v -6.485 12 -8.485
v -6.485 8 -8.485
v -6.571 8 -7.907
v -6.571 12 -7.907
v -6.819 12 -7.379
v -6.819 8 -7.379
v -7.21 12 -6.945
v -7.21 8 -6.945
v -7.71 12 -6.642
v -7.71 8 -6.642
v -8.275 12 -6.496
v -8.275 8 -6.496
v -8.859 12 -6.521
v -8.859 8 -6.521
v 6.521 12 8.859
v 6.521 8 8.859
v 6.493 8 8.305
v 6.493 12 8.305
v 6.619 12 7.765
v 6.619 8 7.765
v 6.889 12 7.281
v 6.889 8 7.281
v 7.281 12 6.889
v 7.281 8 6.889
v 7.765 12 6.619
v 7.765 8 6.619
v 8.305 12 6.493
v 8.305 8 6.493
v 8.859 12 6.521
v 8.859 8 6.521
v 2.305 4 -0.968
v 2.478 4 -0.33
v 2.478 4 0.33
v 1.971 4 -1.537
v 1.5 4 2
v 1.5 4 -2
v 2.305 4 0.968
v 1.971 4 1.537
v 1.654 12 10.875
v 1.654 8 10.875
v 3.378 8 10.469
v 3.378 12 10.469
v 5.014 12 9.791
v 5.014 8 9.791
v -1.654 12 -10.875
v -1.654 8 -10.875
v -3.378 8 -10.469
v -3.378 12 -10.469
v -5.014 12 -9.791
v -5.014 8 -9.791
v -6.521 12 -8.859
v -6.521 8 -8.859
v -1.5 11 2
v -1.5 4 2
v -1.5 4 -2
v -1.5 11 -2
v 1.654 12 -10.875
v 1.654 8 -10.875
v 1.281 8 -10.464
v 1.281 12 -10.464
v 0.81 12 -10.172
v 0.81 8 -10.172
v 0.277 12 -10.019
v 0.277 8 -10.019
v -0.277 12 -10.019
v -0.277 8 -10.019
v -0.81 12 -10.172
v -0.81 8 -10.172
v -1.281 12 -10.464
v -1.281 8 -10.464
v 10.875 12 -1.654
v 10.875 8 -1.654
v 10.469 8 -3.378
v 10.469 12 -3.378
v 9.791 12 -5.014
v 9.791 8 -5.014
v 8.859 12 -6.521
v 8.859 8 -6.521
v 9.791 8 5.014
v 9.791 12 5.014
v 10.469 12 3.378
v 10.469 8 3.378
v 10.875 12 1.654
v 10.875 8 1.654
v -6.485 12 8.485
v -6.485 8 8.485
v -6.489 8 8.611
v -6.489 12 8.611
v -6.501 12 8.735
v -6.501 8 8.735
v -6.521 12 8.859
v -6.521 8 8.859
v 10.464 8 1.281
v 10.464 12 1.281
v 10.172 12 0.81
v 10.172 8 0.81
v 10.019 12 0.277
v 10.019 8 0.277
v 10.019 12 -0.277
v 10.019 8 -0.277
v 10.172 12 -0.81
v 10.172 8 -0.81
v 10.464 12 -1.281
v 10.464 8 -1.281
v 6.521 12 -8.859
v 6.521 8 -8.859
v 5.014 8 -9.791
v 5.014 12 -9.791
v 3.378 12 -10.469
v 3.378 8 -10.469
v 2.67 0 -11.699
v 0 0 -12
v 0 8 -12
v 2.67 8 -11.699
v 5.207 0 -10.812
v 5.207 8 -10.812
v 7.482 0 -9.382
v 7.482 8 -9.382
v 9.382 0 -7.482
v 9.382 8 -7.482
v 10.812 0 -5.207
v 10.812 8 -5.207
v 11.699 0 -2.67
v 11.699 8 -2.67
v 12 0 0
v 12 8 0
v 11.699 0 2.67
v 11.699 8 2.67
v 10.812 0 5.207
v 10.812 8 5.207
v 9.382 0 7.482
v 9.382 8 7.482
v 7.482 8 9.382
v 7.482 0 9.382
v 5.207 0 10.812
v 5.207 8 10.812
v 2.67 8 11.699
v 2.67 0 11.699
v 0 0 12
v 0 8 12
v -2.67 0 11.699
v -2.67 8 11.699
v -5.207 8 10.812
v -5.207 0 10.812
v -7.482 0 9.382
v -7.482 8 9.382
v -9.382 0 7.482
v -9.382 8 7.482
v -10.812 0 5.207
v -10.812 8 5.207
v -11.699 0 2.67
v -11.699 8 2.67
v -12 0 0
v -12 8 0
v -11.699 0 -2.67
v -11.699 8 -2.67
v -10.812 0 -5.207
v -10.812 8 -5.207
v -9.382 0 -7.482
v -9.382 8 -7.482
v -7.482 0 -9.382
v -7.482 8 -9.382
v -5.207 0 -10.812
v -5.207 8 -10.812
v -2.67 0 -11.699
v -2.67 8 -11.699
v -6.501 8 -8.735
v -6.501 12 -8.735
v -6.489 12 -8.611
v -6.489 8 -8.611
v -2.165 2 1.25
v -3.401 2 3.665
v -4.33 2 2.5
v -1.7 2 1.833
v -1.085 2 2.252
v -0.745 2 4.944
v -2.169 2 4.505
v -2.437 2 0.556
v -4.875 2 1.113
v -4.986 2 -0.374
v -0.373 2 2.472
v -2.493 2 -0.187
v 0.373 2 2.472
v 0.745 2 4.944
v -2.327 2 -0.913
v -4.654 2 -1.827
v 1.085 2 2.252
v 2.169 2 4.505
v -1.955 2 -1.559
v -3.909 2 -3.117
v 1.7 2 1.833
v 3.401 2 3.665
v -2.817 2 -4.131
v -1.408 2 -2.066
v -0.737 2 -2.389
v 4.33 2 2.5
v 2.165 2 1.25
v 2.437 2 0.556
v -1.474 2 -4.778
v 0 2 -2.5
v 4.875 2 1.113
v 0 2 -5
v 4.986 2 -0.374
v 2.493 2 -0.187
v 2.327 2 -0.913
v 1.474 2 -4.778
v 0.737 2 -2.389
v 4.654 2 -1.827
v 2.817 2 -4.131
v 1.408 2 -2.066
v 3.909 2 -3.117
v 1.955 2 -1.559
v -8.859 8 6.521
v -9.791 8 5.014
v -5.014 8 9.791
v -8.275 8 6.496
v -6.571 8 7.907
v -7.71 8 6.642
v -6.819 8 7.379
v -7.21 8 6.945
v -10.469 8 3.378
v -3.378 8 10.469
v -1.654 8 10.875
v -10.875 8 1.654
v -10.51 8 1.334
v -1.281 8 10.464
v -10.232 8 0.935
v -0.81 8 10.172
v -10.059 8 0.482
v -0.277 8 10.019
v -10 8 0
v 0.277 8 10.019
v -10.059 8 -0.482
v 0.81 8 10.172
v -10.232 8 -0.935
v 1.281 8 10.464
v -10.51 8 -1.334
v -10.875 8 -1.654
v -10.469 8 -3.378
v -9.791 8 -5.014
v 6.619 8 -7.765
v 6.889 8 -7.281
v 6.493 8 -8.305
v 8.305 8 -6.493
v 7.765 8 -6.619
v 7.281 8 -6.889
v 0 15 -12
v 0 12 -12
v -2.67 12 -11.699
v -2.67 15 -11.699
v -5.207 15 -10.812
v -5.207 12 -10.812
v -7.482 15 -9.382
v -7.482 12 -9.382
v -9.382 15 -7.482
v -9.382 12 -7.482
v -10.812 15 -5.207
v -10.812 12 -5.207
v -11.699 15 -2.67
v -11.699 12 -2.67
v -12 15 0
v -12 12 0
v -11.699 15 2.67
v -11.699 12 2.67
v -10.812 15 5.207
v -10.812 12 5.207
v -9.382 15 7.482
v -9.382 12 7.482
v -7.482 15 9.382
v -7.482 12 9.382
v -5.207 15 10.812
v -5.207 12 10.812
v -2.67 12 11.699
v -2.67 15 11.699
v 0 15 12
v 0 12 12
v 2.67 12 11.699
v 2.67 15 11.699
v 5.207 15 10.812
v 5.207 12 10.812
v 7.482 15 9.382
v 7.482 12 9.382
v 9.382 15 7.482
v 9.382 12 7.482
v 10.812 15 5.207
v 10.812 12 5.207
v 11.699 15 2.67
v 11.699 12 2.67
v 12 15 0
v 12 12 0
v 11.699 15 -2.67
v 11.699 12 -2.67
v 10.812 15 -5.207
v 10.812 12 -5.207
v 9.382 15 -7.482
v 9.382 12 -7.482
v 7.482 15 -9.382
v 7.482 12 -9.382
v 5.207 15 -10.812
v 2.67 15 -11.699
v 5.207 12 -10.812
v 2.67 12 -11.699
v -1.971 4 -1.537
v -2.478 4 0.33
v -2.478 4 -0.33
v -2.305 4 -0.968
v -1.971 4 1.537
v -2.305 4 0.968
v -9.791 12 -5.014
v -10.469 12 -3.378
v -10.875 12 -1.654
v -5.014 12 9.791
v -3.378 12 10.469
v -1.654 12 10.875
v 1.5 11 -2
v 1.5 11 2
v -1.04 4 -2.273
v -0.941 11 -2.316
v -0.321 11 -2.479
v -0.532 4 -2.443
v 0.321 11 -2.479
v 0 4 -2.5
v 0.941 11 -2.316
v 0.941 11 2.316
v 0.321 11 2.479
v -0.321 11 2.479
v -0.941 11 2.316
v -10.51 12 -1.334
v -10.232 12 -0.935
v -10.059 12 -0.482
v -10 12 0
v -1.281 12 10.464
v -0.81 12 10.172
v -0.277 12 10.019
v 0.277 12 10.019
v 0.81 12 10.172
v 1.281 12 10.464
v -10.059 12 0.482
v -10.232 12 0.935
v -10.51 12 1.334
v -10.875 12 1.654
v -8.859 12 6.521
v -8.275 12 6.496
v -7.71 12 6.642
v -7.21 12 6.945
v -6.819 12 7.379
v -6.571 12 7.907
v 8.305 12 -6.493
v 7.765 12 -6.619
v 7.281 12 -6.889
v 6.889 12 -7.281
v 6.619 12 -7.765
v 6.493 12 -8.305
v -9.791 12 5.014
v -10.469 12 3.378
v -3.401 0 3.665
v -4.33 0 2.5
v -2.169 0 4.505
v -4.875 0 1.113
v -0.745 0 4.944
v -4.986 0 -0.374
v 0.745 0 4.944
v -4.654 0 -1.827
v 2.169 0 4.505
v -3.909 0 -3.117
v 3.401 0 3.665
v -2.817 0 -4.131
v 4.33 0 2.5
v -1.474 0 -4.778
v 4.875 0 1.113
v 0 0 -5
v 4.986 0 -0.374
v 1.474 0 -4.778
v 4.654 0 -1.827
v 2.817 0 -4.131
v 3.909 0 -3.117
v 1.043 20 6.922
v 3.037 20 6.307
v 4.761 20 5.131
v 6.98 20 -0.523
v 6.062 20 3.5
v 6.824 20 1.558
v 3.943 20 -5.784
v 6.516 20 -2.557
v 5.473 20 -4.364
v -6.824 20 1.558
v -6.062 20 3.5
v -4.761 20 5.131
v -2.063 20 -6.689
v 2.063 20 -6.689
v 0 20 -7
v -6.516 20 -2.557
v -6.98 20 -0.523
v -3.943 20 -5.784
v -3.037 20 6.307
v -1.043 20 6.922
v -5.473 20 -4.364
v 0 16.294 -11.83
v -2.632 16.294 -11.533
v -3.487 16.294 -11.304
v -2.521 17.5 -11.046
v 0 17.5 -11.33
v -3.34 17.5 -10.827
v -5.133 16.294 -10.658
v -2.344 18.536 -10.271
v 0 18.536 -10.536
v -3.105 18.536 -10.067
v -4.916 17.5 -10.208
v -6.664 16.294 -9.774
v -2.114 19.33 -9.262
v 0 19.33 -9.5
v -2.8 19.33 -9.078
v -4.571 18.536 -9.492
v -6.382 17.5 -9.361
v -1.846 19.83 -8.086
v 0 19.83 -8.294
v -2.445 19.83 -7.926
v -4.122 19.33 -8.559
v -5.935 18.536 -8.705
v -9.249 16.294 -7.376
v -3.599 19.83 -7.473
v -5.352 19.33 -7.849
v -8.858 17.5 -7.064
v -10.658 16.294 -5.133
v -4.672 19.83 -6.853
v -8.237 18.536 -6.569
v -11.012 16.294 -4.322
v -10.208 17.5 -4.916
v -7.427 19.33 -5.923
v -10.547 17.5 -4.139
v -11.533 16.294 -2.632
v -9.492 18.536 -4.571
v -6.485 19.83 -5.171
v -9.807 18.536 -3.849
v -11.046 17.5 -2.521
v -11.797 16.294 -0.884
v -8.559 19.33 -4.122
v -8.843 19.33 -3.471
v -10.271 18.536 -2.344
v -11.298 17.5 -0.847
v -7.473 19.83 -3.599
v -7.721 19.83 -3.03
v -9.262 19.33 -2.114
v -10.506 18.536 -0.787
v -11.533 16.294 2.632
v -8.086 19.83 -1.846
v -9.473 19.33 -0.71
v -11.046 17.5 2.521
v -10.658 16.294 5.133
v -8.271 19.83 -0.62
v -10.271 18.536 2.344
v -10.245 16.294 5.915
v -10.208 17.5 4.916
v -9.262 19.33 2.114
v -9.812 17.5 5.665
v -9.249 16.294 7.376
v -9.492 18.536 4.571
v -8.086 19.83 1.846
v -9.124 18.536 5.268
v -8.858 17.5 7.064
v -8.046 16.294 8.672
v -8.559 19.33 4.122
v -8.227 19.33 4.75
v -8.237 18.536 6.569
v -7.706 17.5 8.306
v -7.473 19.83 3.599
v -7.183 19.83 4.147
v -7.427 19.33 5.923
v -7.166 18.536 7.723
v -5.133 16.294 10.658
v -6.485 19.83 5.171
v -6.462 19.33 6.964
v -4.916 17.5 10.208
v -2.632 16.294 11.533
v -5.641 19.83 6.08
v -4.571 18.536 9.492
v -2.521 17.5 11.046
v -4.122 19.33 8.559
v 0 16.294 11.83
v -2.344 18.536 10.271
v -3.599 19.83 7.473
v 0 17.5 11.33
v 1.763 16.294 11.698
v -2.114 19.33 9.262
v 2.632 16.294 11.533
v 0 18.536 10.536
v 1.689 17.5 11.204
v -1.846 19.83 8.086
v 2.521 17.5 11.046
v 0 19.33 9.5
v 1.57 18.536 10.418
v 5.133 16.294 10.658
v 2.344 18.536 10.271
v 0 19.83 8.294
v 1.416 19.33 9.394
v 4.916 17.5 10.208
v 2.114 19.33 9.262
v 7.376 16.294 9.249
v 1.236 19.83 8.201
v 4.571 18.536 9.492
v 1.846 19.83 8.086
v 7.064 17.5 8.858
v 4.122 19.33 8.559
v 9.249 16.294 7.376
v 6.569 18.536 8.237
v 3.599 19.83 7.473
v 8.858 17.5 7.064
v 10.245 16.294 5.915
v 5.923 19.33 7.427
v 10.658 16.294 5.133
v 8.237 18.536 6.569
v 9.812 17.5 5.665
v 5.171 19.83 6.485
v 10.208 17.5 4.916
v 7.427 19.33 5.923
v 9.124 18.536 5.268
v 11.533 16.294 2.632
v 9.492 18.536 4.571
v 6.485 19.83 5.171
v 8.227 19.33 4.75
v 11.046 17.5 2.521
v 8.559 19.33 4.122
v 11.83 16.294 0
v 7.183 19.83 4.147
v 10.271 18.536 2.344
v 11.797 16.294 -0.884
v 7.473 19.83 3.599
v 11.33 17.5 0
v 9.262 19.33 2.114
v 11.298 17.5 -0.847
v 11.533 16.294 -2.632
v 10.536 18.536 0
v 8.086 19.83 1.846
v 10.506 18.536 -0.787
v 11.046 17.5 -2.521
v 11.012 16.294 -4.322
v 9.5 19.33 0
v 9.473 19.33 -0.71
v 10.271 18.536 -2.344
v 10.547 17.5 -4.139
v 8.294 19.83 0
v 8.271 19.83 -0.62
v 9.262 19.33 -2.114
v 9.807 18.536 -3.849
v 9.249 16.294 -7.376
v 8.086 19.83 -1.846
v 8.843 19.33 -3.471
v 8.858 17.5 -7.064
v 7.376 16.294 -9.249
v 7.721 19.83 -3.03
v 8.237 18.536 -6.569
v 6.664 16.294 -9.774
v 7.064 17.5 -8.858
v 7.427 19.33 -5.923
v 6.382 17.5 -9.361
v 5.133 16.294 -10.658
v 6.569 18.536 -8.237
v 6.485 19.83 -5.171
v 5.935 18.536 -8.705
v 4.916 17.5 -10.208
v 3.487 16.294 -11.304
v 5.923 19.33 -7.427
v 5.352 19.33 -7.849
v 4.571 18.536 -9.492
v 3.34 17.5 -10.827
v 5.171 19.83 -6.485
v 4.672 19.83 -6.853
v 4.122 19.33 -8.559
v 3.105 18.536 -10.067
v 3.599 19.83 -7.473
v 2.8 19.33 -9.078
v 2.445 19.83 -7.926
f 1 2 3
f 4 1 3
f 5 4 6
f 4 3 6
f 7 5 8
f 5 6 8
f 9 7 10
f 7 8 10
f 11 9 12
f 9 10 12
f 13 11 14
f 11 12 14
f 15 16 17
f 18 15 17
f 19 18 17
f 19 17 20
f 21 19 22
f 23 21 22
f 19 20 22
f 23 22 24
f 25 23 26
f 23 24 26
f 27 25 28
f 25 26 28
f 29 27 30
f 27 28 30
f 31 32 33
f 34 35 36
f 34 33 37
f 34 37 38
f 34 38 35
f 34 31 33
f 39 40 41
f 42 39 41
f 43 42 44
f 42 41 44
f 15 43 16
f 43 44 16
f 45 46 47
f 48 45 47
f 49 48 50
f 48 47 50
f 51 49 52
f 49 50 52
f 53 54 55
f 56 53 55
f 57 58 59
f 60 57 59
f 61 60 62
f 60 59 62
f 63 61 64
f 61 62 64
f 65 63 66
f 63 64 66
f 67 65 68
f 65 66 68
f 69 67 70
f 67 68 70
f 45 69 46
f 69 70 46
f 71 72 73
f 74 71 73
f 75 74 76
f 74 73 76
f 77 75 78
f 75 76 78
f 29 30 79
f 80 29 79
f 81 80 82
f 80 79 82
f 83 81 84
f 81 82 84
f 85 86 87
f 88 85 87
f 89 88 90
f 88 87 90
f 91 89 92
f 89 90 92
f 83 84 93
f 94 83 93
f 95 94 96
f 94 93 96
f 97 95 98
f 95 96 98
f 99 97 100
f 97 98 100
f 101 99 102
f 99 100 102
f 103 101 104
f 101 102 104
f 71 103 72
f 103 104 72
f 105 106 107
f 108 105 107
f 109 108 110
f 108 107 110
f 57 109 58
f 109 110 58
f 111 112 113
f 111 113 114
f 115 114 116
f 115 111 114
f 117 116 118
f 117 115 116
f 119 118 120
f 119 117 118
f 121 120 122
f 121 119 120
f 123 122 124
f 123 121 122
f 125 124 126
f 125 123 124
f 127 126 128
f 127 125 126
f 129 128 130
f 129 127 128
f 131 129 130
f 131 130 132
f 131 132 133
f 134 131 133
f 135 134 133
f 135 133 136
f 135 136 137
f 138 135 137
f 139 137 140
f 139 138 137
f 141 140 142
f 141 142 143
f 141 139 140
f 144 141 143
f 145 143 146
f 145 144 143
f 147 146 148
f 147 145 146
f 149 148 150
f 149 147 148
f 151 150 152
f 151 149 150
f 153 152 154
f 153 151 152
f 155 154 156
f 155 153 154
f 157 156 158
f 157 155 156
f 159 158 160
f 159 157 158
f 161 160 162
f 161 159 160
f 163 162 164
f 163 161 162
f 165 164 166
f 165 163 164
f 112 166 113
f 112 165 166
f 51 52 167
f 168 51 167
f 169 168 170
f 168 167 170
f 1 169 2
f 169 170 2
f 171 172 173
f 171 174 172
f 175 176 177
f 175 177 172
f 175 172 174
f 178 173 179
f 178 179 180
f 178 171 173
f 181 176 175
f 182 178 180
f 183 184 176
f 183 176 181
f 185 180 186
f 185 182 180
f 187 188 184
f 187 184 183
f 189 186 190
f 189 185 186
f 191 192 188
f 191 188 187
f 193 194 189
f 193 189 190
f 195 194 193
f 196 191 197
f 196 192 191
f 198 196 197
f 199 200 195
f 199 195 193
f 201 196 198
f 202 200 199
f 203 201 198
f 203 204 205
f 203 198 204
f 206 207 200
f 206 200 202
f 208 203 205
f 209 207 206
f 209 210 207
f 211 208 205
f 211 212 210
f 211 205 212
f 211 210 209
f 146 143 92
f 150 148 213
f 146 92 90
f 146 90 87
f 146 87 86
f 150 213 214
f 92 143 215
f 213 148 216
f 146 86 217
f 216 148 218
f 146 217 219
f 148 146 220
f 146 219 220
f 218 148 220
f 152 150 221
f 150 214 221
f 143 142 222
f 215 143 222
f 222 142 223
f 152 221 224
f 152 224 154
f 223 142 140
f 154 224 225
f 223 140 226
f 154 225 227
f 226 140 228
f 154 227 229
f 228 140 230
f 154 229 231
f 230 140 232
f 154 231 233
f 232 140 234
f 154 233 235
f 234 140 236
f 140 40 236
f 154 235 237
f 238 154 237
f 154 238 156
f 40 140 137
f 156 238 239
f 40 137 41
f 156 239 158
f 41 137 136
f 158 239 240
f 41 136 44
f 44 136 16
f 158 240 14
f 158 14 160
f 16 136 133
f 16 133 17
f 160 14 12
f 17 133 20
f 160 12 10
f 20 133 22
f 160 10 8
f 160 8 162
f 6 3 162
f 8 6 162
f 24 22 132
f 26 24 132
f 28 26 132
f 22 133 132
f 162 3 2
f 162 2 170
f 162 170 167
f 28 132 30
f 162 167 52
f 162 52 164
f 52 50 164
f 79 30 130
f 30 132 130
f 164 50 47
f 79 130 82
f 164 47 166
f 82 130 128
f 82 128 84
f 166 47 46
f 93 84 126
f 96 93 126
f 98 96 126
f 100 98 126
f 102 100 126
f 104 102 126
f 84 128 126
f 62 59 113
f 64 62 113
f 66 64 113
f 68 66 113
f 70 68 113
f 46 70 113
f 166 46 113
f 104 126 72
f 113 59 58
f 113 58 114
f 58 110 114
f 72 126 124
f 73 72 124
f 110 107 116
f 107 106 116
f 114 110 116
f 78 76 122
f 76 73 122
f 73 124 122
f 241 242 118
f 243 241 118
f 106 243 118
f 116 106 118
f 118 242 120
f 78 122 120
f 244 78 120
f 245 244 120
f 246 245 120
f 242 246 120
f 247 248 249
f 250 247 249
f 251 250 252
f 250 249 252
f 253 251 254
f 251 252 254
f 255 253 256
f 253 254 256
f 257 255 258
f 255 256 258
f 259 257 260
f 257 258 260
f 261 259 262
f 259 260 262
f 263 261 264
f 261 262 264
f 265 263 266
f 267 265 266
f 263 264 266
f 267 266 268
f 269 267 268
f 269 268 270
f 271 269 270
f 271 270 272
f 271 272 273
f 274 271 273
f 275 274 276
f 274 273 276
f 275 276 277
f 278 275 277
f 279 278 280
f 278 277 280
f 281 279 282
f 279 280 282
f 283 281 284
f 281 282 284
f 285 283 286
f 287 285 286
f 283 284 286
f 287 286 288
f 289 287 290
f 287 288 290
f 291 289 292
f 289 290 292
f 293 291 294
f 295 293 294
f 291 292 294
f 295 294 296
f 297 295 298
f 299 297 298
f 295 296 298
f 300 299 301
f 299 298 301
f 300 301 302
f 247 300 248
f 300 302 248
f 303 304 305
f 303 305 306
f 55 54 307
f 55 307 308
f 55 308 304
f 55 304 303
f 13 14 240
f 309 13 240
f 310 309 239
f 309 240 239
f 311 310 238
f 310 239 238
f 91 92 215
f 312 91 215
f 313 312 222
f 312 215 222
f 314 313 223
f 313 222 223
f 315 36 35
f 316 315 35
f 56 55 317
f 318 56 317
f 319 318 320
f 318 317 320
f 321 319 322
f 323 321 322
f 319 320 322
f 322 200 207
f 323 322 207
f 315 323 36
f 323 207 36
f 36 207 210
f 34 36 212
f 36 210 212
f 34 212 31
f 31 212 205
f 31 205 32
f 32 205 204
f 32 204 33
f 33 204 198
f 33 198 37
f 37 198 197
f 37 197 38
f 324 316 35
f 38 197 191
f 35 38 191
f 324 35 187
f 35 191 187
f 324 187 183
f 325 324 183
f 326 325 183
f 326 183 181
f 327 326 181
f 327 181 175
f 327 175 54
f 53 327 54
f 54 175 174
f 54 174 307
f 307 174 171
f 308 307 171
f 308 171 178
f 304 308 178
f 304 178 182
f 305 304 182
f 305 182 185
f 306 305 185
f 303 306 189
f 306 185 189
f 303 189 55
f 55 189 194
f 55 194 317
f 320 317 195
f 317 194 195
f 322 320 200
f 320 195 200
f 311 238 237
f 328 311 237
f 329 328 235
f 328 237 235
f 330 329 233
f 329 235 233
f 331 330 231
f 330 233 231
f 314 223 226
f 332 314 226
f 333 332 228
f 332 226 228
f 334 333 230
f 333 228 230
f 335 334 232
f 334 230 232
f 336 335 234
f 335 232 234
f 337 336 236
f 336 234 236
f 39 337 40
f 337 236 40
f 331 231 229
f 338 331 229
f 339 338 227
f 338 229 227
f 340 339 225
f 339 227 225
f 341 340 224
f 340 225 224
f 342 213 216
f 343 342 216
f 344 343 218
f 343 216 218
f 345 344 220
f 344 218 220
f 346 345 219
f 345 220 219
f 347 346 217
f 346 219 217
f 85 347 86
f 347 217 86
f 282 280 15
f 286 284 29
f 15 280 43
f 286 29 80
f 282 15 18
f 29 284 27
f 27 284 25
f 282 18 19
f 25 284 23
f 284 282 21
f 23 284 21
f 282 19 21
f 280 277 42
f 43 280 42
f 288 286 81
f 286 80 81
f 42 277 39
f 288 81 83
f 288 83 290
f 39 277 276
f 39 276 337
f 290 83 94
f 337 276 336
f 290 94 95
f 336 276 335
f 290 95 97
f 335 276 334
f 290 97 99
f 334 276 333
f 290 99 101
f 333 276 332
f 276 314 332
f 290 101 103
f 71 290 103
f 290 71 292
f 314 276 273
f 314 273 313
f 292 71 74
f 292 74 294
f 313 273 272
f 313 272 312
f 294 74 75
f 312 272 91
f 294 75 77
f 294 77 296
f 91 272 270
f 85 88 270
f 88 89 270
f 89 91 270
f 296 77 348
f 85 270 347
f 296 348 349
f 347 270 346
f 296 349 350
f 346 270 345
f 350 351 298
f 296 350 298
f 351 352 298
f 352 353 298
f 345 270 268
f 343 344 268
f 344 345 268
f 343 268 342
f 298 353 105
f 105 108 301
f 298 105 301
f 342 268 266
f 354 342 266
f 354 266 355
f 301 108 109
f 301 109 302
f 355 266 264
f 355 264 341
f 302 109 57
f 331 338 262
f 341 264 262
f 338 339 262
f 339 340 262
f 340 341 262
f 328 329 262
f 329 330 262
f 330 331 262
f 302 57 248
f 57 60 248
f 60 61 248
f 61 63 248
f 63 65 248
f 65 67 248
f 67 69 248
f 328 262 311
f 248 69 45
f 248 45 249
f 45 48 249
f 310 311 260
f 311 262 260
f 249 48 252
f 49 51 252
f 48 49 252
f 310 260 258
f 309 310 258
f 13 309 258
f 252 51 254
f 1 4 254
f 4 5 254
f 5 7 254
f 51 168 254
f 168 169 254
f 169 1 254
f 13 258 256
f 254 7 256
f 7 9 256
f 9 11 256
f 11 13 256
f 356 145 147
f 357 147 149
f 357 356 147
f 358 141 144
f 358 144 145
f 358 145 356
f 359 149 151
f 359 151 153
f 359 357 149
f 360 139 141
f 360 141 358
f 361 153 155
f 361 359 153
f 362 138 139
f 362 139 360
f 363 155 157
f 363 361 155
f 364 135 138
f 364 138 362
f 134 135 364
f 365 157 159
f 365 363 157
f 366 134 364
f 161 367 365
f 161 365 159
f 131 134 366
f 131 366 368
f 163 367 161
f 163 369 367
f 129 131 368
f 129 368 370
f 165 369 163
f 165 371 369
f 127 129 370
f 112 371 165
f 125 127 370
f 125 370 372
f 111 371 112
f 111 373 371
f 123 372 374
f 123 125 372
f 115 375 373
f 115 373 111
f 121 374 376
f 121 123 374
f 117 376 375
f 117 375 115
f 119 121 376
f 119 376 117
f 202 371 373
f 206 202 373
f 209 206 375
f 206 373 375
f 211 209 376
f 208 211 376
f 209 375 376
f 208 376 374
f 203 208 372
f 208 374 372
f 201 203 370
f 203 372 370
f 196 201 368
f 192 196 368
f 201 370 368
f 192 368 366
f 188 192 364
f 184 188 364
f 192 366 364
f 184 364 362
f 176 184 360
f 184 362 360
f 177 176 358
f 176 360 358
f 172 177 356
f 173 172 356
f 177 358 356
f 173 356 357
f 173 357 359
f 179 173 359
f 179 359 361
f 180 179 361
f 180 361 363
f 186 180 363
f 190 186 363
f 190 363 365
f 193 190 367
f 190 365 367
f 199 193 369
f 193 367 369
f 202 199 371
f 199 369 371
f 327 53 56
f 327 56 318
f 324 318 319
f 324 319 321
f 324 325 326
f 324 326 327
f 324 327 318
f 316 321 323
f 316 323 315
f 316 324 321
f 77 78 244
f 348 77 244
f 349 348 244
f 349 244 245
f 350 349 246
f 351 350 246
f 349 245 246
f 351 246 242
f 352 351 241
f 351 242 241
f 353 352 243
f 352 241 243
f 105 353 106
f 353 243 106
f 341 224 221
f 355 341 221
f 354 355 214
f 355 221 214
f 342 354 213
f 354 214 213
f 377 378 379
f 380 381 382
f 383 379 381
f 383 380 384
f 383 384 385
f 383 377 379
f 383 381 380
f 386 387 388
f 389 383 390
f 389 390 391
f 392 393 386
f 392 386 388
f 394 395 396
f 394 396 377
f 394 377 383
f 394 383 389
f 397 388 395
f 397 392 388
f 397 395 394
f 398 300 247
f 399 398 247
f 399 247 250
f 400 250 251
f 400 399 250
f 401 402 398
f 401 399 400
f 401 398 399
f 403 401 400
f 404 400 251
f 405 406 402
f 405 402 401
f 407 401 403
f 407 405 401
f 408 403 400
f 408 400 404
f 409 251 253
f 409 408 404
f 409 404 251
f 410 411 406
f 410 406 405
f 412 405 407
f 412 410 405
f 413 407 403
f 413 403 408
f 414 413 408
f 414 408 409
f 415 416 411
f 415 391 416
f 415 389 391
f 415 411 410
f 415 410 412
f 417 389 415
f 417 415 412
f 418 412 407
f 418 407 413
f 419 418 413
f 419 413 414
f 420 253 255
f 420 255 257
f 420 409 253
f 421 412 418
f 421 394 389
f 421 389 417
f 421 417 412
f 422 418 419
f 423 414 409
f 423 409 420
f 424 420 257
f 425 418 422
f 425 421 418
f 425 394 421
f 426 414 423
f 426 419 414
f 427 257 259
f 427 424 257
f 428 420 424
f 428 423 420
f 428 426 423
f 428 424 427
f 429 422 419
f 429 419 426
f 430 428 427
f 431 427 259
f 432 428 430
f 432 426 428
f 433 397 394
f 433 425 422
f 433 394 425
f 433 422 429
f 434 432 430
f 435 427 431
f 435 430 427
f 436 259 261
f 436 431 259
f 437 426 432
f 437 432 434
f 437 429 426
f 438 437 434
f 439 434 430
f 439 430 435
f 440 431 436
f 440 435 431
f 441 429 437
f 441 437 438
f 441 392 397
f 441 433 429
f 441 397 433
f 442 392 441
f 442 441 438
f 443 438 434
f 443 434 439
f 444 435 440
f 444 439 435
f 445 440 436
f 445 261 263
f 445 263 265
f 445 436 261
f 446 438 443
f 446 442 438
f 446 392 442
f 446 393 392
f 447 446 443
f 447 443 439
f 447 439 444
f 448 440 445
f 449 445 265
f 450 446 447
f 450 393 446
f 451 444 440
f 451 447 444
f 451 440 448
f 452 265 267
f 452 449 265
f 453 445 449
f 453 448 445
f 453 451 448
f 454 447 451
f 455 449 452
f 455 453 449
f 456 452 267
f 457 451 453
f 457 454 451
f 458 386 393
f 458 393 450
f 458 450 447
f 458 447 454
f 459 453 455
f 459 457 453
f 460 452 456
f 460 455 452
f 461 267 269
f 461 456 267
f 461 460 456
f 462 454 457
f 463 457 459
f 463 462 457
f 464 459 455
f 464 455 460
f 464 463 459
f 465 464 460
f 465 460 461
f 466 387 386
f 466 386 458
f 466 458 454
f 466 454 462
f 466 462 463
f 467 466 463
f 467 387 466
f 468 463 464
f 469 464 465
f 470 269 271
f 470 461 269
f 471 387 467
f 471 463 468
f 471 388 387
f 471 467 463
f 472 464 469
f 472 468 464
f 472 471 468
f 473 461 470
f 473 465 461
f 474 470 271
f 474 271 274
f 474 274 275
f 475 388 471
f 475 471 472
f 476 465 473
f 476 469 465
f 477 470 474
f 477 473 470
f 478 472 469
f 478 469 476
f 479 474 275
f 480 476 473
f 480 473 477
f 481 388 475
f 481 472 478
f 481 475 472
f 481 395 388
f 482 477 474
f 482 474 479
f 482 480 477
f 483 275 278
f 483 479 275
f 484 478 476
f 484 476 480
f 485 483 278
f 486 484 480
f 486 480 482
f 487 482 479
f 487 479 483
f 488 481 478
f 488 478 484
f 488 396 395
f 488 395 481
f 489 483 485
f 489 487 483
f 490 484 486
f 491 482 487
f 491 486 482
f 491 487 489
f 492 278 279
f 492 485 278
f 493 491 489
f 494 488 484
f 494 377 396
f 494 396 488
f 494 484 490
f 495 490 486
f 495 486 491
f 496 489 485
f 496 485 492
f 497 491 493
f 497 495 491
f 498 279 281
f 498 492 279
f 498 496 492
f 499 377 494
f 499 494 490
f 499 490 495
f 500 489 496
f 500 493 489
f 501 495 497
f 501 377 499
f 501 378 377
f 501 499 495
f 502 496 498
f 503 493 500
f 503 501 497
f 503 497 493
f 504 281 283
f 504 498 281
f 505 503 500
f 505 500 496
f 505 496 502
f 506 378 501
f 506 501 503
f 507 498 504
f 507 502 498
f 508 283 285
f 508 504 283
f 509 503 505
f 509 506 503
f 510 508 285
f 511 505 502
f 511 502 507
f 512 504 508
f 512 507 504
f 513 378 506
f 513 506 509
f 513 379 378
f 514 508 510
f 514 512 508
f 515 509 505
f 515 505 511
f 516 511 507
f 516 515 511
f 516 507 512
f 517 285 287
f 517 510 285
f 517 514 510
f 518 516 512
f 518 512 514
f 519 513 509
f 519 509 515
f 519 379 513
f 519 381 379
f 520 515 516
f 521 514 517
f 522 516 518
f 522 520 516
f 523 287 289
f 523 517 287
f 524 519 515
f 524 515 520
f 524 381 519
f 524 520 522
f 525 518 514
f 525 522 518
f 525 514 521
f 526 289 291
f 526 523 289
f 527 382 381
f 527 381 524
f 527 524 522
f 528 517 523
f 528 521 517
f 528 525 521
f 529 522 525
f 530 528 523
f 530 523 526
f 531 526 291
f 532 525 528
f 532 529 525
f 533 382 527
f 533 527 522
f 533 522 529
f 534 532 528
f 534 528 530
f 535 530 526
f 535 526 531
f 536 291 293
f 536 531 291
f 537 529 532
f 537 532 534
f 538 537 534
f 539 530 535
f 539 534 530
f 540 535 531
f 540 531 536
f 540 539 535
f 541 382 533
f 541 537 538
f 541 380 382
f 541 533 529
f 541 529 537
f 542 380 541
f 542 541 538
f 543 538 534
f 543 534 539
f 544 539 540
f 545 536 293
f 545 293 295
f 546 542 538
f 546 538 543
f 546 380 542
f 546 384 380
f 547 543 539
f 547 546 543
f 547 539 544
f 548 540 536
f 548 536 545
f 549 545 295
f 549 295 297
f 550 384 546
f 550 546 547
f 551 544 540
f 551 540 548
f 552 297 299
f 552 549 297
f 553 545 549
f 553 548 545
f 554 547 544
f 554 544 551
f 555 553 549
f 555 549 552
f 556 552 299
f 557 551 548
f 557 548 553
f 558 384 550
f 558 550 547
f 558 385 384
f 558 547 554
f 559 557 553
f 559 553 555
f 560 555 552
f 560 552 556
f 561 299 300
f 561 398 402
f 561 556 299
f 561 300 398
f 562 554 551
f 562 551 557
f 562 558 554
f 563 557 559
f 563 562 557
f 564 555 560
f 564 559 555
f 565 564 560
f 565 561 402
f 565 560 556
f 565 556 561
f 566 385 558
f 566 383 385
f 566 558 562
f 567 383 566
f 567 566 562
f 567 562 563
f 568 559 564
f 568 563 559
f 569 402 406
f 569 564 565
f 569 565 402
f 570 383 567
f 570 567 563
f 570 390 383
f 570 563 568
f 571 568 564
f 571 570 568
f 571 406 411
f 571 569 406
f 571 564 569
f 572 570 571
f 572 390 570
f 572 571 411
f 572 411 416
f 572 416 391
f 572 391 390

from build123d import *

# Parameters (mm, degrees)
SALIENTE_EXTRUIR3_DEPTH = 20
CROQUIS13_R             = 12
SALIENTE_EXTRUIR4_DEPTH = 8
SALIENTE_EXTRUIR5_START = -8
CROQUIS15_R             = 12
SALIENTE_EXTRUIR5_DEPTH = 8
CROQUIS16_R             = 5
CORTAR_EXTRUIR6_DEPTH   = 2
CROQUIS17_R             = 2.5
CORTAR_EXTRUIR7_DEPTH   = 2
CORTAR_EXTRUIR8_DEPTH   = 7
REDONDEO2_R             = 5


with BuildPart() as part:
    # Croquis12 → Saliente-Extruir3 (new body)
    with BuildSketch(Plane(origin=(0, 0, 0), x_dir=(1, 0, 0), z_dir=(0, 1, 0))):
        with BuildLine():
            ThreePointArc((10.875, -1.653594569), (10, 0), (10.875, 1.653594569))
            ThreePointArc((10.875, 1.653594569), (10.162674858, 4.209517756), (8.859054179, 6.520518312))
            ThreePointArc((8.859054179, 6.520518312), (7.071067812, 7.071067812), (6.520518312, 8.859054179))
            ThreePointArc((6.520518312, 8.859054179), (4.209517756, 10.162674858), (1.653594569, 10.875))
            ThreePointArc((1.653594569, 10.875), (0, 10), (-1.653594569, 10.875))
            ThreePointArc((-1.653594569, 10.875), (-4.209517756, 10.162674858), (-6.520518312, 8.859054179))
            ThreePointArc((-6.520518312, 8.859054179), (-6.494110095, 8.672996418), (-6.485281374, 8.485281374))
            ThreePointArc((-6.485281374, 8.485281374), (-7.210045241, 6.94457608), (-8.859054179, 6.520518312))
            ThreePointArc((-8.859054179, 6.520518312), (-10.162674858, 4.209517756), (-10.875, 1.653594569))
            ThreePointArc((-10.875, 1.653594569), (-10.232233047, 0.935414347), (-10, 0))
            ThreePointArc((-10, 0), (-10.232233047, -0.935414347), (-10.875, -1.653594569))
            ThreePointArc((-10.875, -1.653594569), (-10.162674858, -4.209517756), (-8.859054179, -6.520518312))
            ThreePointArc((-8.859054179, -6.520518312), (-7.210045241, -6.94457608), (-6.485281374, -8.485281374))
            ThreePointArc((-6.485281374, -8.485281374), (-6.494110095, -8.672996418), (-6.520518312, -8.859054179))
            ThreePointArc((-6.520518312, -8.859054179), (-4.209517756, -10.162674858), (-1.653594569, -10.875))
            ThreePointArc((-1.653594569, -10.875), (0, -10), (1.653594569, -10.875))
            ThreePointArc((1.653594569, -10.875), (4.209517756, -10.162674858), (6.520518312, -8.859054179))
            ThreePointArc((6.520518312, -8.859054179), (7.071067812, -7.071067812), (8.859054179, -6.520518312))
            ThreePointArc((8.859054179, -6.520518312), (10.162674858, -4.209517756), (10.875, -1.653594569))
        make_face()
    extrude(amount=SALIENTE_EXTRUIR3_DEPTH)

    # Croquis13 → Saliente-Extruir4 (add)
    with BuildSketch(Plane.XZ):
        with Locations(Location((0, 0, 0), (0, 0, 270))):
            Circle(CROQUIS13_R)
    extrude(amount=-SALIENTE_EXTRUIR4_DEPTH)

    # Croquis15 → Saliente-Extruir5 (add)
    with BuildSketch(Plane(origin=(0, 20, 0), x_dir=(1, 0, 0), z_dir=(0, 1, 0)).offset(SALIENTE_EXTRUIR5_START)):
        with Locations(Location((0, 0, 0), (0, 0, 90))):
            Circle(CROQUIS15_R)
    extrude(amount=SALIENTE_EXTRUIR5_DEPTH)

    # Croquis16 → Cortar-Extruir6 (cut)
    with BuildSketch(Plane.XZ):
        with Locations(Location((0, 0, 0), (0, 0, 270))):
            Circle(CROQUIS16_R)
    extrude(amount=-CORTAR_EXTRUIR6_DEPTH, mode=Mode.SUBTRACT)

    # Croquis17 → Cortar-Extruir7 (cut)
    with BuildSketch(Plane.XZ.offset(-2)):
        with Locations(Location((0, 0, 0), (0, 0, 270))):
            Circle(CROQUIS17_R)
    extrude(amount=-CORTAR_EXTRUIR7_DEPTH, mode=Mode.SUBTRACT)

    # Croquis18 → Cortar-Extruir8 (cut)
    with BuildSketch(Plane.XZ.offset(-4)):
        with BuildLine():
            Line((-1.5, 2), (-1.5, -2))
            ThreePointArc((-1.5, -2), (0, -2.5), (1.5, -2))
            Line((1.5, -2), (1.5, 2))
            ThreePointArc((1.5, 2), (0, 2.5), (-1.5, 2))
        make_face()
    extrude(amount=-CORTAR_EXTRUIR8_DEPTH, mode=Mode.SUBTRACT)

    # Redondeo2
    redondeo2_edges = [part.edges().sort_by_distance(p)[0] for p in [
        (0, 20, 12),
    ]]
    fillet(redondeo2_edges, radius=REDONDEO2_R)


solid = part.part
